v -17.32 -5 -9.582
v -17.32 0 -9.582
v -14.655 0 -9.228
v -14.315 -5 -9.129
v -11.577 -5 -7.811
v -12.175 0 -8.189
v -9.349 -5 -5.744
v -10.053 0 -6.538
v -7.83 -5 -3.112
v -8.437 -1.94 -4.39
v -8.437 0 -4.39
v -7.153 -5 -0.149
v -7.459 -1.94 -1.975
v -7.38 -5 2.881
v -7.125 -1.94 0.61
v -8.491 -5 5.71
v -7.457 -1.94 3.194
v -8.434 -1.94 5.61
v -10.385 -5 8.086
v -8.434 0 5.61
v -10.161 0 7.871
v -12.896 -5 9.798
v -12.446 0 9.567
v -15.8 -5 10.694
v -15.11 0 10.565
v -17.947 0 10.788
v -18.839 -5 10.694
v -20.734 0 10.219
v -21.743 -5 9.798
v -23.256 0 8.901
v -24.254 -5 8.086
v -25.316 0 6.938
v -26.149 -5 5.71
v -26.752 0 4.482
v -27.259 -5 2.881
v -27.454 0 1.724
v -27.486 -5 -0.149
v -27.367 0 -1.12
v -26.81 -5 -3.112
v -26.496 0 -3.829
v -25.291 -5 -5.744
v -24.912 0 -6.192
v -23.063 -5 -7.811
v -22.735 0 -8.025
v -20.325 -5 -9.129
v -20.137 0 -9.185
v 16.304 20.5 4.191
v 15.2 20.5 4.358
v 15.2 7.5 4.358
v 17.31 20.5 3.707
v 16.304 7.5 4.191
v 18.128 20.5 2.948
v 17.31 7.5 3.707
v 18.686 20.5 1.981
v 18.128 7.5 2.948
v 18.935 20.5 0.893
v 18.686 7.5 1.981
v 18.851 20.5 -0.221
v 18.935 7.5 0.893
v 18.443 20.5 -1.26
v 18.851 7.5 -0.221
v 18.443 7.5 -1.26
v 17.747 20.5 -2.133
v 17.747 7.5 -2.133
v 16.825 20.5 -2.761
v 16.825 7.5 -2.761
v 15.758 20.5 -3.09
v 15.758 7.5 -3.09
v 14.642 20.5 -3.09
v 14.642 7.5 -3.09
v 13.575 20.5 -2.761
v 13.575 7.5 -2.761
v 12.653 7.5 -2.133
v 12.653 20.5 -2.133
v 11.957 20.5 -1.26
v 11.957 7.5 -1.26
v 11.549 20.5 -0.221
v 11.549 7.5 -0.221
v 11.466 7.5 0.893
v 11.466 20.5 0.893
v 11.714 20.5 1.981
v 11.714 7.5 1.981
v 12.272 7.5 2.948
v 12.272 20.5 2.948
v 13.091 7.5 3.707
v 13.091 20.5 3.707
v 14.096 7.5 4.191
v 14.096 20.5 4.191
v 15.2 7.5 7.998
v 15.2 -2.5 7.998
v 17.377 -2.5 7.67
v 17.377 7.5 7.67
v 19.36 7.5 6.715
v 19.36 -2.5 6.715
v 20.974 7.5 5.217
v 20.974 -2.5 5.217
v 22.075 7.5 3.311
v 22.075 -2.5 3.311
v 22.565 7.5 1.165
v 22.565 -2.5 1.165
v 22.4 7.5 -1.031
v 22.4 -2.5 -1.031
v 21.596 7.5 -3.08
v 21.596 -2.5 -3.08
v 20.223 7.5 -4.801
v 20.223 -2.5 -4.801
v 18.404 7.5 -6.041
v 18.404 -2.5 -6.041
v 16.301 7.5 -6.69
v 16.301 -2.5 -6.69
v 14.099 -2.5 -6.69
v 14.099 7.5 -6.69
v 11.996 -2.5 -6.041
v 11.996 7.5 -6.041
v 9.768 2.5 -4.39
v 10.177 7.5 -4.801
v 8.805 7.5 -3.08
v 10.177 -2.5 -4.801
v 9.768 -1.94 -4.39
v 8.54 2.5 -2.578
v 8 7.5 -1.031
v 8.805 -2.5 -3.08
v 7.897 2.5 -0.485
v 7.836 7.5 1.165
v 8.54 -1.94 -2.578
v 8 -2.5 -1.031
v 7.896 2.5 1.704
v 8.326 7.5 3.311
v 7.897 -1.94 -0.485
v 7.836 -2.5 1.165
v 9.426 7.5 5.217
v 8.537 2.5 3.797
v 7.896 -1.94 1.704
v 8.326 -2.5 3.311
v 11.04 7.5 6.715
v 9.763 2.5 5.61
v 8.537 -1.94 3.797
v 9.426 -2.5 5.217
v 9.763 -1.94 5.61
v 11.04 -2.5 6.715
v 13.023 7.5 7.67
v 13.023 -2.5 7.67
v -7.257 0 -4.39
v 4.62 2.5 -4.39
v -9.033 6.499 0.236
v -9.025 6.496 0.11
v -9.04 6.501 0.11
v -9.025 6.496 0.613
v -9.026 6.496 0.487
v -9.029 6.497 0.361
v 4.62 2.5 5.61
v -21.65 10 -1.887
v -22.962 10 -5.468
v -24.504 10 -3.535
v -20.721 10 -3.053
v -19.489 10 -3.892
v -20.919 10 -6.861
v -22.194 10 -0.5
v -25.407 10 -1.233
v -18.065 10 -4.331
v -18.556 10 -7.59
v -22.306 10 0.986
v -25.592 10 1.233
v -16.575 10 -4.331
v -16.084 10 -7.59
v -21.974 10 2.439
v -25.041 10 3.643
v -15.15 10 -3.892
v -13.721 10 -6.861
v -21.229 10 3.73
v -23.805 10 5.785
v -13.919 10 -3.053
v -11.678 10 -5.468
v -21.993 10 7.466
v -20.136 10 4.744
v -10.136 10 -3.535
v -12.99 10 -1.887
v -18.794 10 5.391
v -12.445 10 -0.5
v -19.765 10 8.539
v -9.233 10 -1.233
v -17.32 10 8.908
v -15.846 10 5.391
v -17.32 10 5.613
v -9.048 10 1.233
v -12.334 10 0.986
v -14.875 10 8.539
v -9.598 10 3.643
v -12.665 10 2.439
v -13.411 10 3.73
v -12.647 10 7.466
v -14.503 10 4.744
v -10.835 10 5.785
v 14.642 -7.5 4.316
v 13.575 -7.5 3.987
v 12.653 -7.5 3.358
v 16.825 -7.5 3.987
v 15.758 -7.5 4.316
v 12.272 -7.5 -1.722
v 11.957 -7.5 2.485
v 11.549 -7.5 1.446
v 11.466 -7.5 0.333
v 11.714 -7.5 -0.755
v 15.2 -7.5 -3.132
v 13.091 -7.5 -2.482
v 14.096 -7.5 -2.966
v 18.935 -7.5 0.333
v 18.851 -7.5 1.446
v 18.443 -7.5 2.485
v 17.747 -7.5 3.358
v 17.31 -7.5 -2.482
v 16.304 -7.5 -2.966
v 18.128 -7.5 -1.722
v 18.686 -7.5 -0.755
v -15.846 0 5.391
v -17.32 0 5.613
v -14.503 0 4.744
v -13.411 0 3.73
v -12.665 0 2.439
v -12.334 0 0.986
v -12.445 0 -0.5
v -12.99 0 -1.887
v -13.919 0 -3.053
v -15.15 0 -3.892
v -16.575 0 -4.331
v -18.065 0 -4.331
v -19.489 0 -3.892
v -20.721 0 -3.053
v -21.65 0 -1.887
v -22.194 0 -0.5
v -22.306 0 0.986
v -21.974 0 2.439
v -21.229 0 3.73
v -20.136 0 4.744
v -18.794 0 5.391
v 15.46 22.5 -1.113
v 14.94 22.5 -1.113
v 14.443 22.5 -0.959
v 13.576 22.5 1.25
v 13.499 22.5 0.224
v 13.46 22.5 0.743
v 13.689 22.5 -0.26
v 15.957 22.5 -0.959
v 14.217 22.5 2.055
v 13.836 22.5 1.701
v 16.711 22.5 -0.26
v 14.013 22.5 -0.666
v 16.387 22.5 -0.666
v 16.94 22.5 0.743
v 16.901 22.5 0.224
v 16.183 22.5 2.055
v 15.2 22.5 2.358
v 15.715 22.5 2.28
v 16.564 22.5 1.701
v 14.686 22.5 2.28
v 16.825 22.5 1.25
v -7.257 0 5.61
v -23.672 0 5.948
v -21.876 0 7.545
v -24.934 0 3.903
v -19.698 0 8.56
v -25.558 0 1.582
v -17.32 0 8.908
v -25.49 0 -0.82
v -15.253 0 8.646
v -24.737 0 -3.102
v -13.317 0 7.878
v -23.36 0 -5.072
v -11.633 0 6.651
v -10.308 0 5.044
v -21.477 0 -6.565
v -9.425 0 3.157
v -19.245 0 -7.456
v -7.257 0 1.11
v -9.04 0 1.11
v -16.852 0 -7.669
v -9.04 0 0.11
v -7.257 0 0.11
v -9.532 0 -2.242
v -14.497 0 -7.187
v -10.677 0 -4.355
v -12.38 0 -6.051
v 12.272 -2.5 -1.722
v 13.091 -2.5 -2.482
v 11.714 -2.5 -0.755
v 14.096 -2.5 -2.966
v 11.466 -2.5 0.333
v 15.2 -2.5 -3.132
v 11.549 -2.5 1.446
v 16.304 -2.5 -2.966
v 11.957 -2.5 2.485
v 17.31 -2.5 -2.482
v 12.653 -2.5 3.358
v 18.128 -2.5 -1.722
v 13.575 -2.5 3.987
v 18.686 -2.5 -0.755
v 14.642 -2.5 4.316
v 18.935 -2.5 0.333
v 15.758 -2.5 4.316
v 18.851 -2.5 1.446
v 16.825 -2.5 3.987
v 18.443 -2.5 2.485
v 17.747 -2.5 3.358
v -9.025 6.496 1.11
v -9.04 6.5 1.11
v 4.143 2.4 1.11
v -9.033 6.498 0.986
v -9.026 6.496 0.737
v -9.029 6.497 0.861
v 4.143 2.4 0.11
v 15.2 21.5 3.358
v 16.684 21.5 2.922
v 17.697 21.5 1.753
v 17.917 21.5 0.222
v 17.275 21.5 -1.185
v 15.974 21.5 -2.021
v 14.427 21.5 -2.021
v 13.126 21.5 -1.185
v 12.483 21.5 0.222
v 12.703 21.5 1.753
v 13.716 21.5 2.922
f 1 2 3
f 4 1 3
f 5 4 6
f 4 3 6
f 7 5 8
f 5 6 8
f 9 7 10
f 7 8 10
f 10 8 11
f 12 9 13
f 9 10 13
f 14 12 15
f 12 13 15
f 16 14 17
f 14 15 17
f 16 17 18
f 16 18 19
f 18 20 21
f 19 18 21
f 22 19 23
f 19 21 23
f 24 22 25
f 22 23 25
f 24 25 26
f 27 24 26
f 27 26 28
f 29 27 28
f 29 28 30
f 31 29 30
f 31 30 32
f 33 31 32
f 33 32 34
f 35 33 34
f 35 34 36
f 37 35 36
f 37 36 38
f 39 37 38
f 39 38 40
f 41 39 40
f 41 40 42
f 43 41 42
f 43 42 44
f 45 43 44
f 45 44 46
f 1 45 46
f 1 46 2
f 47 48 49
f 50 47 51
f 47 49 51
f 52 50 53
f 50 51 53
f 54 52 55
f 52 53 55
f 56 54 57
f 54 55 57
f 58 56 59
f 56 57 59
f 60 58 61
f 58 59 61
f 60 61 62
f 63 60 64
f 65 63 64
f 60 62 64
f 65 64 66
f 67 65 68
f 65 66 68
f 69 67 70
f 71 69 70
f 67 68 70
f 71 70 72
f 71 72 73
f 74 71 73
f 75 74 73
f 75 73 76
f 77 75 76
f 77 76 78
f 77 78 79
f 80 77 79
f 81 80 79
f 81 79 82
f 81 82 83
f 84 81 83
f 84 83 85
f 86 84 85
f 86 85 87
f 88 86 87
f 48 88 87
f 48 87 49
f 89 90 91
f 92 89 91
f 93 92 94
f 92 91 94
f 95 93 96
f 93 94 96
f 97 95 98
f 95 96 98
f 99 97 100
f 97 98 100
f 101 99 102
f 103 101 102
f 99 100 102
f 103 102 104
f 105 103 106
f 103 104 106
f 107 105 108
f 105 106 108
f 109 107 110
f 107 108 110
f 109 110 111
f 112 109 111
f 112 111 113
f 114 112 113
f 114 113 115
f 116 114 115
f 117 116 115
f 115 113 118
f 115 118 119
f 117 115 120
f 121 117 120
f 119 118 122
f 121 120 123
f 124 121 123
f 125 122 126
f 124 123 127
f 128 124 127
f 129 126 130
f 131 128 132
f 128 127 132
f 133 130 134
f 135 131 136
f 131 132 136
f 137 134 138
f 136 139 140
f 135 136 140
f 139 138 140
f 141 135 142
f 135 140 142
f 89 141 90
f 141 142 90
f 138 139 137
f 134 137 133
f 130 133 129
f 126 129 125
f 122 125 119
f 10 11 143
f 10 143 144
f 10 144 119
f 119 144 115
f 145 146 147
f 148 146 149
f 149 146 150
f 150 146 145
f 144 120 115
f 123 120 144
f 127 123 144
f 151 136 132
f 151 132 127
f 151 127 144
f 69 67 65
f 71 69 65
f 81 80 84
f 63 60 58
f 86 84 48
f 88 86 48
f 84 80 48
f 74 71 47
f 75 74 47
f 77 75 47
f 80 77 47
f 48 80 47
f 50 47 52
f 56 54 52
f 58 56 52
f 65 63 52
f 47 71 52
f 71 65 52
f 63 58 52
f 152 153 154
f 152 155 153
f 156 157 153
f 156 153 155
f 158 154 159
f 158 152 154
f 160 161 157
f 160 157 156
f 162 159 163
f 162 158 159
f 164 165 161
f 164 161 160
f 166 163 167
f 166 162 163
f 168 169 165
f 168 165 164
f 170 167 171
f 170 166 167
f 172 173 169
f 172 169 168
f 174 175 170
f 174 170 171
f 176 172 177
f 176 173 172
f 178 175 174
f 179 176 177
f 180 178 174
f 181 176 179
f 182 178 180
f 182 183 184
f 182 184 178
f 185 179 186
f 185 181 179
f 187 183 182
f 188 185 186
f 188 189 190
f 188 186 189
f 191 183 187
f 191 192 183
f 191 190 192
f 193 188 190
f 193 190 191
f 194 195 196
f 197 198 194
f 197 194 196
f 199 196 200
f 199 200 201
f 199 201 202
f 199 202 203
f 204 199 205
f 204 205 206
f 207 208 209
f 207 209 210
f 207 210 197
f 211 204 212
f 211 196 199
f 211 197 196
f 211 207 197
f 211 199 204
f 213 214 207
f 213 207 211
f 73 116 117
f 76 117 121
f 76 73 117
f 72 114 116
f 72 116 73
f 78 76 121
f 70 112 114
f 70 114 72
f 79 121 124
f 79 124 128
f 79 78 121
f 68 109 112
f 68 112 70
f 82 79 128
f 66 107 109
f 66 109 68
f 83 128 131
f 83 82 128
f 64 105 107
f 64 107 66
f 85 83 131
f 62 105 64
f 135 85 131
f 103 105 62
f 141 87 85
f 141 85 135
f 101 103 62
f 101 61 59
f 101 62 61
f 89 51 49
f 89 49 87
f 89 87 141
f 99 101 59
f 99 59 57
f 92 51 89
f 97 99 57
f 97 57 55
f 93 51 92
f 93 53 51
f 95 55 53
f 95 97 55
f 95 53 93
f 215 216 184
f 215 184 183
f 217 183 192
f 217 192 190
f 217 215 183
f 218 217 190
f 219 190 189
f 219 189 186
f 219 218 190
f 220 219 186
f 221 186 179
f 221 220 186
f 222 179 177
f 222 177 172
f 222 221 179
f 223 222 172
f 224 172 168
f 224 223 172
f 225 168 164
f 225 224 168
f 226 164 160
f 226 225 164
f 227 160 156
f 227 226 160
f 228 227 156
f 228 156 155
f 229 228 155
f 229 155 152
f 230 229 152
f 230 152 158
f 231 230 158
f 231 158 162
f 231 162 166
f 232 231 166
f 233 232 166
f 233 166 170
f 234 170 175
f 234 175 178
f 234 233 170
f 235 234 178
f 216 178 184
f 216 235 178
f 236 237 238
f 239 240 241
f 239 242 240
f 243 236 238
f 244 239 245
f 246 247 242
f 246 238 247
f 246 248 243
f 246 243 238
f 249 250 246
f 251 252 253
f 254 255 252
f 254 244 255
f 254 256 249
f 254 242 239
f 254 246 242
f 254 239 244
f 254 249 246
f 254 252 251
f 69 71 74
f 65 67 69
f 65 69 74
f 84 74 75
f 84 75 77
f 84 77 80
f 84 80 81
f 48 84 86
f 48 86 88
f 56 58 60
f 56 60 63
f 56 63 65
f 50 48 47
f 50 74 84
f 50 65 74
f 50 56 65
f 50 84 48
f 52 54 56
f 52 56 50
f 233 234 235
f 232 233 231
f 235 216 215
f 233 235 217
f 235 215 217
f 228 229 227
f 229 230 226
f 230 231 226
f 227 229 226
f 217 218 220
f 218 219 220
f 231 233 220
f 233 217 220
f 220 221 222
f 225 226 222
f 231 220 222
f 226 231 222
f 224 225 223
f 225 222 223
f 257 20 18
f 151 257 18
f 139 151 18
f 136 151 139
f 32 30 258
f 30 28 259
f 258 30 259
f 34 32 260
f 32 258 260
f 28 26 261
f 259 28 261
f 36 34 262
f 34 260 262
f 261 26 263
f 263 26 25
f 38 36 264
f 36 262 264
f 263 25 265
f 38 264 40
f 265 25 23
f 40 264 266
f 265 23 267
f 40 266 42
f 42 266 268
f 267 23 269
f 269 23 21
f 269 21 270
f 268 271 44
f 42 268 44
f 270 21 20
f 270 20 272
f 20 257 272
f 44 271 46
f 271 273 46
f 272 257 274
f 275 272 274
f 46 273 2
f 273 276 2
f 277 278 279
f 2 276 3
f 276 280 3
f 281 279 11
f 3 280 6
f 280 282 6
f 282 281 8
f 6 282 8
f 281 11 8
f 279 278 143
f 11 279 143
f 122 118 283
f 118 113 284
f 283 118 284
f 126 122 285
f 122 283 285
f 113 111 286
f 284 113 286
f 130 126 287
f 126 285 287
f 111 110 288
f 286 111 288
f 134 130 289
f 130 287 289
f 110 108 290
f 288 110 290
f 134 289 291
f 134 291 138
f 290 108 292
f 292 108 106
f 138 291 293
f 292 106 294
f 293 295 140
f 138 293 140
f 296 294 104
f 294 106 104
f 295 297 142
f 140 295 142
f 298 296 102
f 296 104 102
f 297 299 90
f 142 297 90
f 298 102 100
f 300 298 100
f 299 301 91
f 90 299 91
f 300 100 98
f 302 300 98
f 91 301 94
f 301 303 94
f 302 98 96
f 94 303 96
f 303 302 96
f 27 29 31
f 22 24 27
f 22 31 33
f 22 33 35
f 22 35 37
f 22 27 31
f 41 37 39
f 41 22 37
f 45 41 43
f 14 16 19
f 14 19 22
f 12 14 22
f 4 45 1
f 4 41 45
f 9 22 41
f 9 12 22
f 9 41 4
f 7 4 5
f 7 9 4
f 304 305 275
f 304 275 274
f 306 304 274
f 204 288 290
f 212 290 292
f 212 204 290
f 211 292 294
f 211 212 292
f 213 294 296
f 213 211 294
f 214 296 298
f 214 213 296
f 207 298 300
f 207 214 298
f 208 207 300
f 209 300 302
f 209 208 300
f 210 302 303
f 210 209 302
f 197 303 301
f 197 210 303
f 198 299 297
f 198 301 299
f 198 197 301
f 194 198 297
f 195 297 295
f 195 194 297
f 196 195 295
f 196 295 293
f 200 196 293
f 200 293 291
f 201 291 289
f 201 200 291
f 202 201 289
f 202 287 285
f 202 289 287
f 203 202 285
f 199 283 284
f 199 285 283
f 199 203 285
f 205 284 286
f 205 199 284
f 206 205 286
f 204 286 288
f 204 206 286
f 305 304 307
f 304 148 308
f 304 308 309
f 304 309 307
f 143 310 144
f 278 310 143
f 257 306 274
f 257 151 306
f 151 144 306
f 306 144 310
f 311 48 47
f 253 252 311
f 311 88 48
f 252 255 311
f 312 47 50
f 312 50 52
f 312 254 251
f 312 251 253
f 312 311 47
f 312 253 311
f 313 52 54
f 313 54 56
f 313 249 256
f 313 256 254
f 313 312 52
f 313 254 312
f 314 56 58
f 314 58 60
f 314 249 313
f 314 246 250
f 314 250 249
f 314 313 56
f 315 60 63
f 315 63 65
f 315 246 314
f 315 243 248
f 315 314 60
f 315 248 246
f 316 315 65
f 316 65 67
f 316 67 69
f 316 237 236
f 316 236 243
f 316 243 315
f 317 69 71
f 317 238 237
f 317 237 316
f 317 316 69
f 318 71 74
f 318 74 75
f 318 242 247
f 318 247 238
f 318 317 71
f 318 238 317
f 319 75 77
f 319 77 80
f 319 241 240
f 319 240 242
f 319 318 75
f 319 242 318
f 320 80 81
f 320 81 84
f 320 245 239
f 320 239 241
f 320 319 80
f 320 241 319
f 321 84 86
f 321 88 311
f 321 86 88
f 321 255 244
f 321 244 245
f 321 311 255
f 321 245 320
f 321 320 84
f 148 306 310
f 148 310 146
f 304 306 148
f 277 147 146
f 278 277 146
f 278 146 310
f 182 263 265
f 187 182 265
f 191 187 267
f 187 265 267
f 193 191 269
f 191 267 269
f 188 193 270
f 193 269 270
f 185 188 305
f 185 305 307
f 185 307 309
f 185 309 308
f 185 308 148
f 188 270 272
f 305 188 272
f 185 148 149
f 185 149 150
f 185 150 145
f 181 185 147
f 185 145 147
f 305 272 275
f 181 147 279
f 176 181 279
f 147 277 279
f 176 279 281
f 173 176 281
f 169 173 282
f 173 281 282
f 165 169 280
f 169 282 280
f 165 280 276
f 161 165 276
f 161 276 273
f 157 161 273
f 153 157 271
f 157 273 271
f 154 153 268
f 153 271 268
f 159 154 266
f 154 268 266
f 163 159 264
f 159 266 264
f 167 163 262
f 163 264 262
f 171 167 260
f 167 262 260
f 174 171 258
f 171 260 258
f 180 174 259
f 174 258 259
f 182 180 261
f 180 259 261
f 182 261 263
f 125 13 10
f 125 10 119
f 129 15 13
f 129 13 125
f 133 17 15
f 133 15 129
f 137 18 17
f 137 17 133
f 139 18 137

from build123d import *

# Parameters (mm, degrees)
CROQUIS1_R               = 8.295
CROQUIS1_R_2             = 5
SALIENTE_EXTRUIR1_DEPTH  = 10
CROQUIS2_R               = 10.195
SALIENTE_EXTRUIR2_DEPTH  = 5
CROQUIS5_R               = 3.745
SALIENTE_EXTRUIR3_DEPTH  = 2.5
CROQUIS6_R               = 7.385
SALIENTE_EXTRUIR4_DEPTH  = 10
CROQUIS7_R               = 3.745
CORTAR_EXTRUIR3_DEPTH    = 10
CROQUIS8_R               = 3.745
SALIENTE_EXTRUIR5_DEPTH  = 23
CROQUIS9_R               = 3.745
SALIENTE_EXTRUIR6_DEPTH  = 2
SALIENTE_EXTRUIR6_TAPER  = 45
SALIENTE_EXTRUIR16_DEPTH = 5
SALIENTE_EXTRUIR19_DEPTH = 0.5
SALIENTE_EXTRUIR20_DEPTH = 5


with BuildPart() as part:
    # Croquis1 → Saliente-Extruir1 (new body)
    with BuildSketch(Plane(origin=(0, 0, 0), x_dir=(1, 0, 0), z_dir=(0, 1, 0))):
        with Locations(Location((-17.319844218, -0.612730338, 0), (0, 0, 270))):
            Circle(CROQUIS1_R)
        with Locations(Location((-17.319844218, -0.612730338, 0), (0, 0, 270))):
            Circle(CROQUIS1_R_2, mode=Mode.SUBTRACT)
    extrude(amount=SALIENTE_EXTRUIR1_DEPTH)

    # Croquis2 → Saliente-Extruir2 (add)
    with BuildSketch(Plane.XZ):
        with Locations(Location((-17.319844218, 0.612730338, 0), (0, 0, 270))):
            Circle(CROQUIS2_R)
    extrude(amount=SALIENTE_EXTRUIR2_DEPTH)



with BuildPart() as body_2:
    # Croquis5 → Saliente-Extruir3 (new, symmetric)
    with BuildSketch(Plane.XZ.offset(5)):
        with Locations(Location((15.200155782, 0.612730338, 0), (0, 0, 270))):
            Circle(CROQUIS5_R)
    extrude(amount=SALIENTE_EXTRUIR3_DEPTH, both=True)

    # Croquis6 → Saliente-Extruir4 (add)
    with BuildSketch(Plane(origin=(0, -2.5, 0), x_dir=(1, 0, 0), z_dir=(0, 1, 0))):
        with Locations(Location((15.200155782, -0.612730338, 0), (0, 0, 270))):
            Circle(CROQUIS6_R)
    extrude(amount=SALIENTE_EXTRUIR4_DEPTH)

    # Croquis7 → Cortar-Extruir3 (cut)
    with BuildSketch(Plane.XZ.offset(2.5)):
        with Locations(Location((15.200155782, 0.612730338, 0), (0, 0, 270))):
            Circle(CROQUIS7_R)
    extrude(amount=-CORTAR_EXTRUIR3_DEPTH, mode=Mode.SUBTRACT)


with BuildPart() as cortar_extruir3_piece_1:
    # of the separate pieces the step leaves, piece 1, a body of its own (cortar_extruir3_pieces)
    add(body_2.part.solids().sort_by_distance((15.200155782, -2.5, 7.997730338))[0])



with BuildPart() as cortar_extruir3_piece_2:
    # of the separate pieces the step leaves, piece 2, a body of its own (cortar_extruir3_pieces)
    add(body_2.part.solids().sort_by_distance((15.200155782, -7.5, -3.132269662))[0])


with BuildPart() as cortar_extruir3_piece_1_1:
    add(cortar_extruir3_piece_1.part)

    add(cortar_extruir3_piece_2.part)  # Saliente-Extruir5 merges Cortar-Extruir3 piece 2
    # Croquis8 → Saliente-Extruir5 (add)
    with BuildSketch(Plane(origin=(0, -2.5, 0), x_dir=(1, 0, 0), z_dir=(0, 1, 0))):
        with Locations(Location((15.200155782, -0.612730338, 0), (0, 0, 270))):
            Circle(CROQUIS8_R)
    extrude(amount=SALIENTE_EXTRUIR5_DEPTH)


with BuildPart() as body_3:
    # Croquis9 → Saliente-Extruir6 (new body)
    with BuildSketch(Plane(origin=(0, 20.5, 0), x_dir=(1, 0, 0), z_dir=(0, 1, 0))):
        with Locations(Location((15.200155782, -0.612730338, 0), (0, 0, 270))):
            Circle(CROQUIS9_R)
    extrude(amount=SALIENTE_EXTRUIR6_DEPTH, taper=SALIENTE_EXTRUIR6_TAPER)


with BuildPart() as part_1:
    add(part.part)

    add(cortar_extruir3_piece_1_1.part)  # Saliente-Extruir16 merges Cortar-Extruir3 piece 1
    # Croquis20 → Saliente-Extruir16 (add, symmetric)
    with BuildSketch(Plane.XY.offset(0.61)):
        Polygon((-8.479007735, 0), (-8.479007735, -1.94), (9.975281452, -1.94), (9.975281452, 2.5), (4.620155782, 2.5), (-7.124844218, 0), align=None)
    extrude(amount=SALIENTE_EXTRUIR16_DEPTH, both=True)

    # Croquis21 → Saliente-Extruir19 (add, symmetric)
    with BuildSketch(Plane.XY.offset(0.61)):
        Polygon((-7.124844218, 0), (4.145155782, 2.398893146), (-9.024844218, 6.495848731), (-12.124187609, 7.46), (-12.124187609, 0), align=None)
    extrude(amount=SALIENTE_EXTRUIR19_DEPTH, both=True)

    # Croquis22 → Saliente-Extruir20 (add, symmetric)
    with BuildSketch(Plane.XY.offset(0.61)):
        Polygon((-8.433600865, 0), (-8.433600865, -1.94), (9.762737192, -1.94), (9.762737192, 2.5), (7.424161683, 2.5), (4.620155782, 2.5), (-7.257448558, 0), align=None)
    extrude(amount=SALIENTE_EXTRUIR20_DEPTH, both=True)


solid = Compound([body_3.part, part_1.part])
